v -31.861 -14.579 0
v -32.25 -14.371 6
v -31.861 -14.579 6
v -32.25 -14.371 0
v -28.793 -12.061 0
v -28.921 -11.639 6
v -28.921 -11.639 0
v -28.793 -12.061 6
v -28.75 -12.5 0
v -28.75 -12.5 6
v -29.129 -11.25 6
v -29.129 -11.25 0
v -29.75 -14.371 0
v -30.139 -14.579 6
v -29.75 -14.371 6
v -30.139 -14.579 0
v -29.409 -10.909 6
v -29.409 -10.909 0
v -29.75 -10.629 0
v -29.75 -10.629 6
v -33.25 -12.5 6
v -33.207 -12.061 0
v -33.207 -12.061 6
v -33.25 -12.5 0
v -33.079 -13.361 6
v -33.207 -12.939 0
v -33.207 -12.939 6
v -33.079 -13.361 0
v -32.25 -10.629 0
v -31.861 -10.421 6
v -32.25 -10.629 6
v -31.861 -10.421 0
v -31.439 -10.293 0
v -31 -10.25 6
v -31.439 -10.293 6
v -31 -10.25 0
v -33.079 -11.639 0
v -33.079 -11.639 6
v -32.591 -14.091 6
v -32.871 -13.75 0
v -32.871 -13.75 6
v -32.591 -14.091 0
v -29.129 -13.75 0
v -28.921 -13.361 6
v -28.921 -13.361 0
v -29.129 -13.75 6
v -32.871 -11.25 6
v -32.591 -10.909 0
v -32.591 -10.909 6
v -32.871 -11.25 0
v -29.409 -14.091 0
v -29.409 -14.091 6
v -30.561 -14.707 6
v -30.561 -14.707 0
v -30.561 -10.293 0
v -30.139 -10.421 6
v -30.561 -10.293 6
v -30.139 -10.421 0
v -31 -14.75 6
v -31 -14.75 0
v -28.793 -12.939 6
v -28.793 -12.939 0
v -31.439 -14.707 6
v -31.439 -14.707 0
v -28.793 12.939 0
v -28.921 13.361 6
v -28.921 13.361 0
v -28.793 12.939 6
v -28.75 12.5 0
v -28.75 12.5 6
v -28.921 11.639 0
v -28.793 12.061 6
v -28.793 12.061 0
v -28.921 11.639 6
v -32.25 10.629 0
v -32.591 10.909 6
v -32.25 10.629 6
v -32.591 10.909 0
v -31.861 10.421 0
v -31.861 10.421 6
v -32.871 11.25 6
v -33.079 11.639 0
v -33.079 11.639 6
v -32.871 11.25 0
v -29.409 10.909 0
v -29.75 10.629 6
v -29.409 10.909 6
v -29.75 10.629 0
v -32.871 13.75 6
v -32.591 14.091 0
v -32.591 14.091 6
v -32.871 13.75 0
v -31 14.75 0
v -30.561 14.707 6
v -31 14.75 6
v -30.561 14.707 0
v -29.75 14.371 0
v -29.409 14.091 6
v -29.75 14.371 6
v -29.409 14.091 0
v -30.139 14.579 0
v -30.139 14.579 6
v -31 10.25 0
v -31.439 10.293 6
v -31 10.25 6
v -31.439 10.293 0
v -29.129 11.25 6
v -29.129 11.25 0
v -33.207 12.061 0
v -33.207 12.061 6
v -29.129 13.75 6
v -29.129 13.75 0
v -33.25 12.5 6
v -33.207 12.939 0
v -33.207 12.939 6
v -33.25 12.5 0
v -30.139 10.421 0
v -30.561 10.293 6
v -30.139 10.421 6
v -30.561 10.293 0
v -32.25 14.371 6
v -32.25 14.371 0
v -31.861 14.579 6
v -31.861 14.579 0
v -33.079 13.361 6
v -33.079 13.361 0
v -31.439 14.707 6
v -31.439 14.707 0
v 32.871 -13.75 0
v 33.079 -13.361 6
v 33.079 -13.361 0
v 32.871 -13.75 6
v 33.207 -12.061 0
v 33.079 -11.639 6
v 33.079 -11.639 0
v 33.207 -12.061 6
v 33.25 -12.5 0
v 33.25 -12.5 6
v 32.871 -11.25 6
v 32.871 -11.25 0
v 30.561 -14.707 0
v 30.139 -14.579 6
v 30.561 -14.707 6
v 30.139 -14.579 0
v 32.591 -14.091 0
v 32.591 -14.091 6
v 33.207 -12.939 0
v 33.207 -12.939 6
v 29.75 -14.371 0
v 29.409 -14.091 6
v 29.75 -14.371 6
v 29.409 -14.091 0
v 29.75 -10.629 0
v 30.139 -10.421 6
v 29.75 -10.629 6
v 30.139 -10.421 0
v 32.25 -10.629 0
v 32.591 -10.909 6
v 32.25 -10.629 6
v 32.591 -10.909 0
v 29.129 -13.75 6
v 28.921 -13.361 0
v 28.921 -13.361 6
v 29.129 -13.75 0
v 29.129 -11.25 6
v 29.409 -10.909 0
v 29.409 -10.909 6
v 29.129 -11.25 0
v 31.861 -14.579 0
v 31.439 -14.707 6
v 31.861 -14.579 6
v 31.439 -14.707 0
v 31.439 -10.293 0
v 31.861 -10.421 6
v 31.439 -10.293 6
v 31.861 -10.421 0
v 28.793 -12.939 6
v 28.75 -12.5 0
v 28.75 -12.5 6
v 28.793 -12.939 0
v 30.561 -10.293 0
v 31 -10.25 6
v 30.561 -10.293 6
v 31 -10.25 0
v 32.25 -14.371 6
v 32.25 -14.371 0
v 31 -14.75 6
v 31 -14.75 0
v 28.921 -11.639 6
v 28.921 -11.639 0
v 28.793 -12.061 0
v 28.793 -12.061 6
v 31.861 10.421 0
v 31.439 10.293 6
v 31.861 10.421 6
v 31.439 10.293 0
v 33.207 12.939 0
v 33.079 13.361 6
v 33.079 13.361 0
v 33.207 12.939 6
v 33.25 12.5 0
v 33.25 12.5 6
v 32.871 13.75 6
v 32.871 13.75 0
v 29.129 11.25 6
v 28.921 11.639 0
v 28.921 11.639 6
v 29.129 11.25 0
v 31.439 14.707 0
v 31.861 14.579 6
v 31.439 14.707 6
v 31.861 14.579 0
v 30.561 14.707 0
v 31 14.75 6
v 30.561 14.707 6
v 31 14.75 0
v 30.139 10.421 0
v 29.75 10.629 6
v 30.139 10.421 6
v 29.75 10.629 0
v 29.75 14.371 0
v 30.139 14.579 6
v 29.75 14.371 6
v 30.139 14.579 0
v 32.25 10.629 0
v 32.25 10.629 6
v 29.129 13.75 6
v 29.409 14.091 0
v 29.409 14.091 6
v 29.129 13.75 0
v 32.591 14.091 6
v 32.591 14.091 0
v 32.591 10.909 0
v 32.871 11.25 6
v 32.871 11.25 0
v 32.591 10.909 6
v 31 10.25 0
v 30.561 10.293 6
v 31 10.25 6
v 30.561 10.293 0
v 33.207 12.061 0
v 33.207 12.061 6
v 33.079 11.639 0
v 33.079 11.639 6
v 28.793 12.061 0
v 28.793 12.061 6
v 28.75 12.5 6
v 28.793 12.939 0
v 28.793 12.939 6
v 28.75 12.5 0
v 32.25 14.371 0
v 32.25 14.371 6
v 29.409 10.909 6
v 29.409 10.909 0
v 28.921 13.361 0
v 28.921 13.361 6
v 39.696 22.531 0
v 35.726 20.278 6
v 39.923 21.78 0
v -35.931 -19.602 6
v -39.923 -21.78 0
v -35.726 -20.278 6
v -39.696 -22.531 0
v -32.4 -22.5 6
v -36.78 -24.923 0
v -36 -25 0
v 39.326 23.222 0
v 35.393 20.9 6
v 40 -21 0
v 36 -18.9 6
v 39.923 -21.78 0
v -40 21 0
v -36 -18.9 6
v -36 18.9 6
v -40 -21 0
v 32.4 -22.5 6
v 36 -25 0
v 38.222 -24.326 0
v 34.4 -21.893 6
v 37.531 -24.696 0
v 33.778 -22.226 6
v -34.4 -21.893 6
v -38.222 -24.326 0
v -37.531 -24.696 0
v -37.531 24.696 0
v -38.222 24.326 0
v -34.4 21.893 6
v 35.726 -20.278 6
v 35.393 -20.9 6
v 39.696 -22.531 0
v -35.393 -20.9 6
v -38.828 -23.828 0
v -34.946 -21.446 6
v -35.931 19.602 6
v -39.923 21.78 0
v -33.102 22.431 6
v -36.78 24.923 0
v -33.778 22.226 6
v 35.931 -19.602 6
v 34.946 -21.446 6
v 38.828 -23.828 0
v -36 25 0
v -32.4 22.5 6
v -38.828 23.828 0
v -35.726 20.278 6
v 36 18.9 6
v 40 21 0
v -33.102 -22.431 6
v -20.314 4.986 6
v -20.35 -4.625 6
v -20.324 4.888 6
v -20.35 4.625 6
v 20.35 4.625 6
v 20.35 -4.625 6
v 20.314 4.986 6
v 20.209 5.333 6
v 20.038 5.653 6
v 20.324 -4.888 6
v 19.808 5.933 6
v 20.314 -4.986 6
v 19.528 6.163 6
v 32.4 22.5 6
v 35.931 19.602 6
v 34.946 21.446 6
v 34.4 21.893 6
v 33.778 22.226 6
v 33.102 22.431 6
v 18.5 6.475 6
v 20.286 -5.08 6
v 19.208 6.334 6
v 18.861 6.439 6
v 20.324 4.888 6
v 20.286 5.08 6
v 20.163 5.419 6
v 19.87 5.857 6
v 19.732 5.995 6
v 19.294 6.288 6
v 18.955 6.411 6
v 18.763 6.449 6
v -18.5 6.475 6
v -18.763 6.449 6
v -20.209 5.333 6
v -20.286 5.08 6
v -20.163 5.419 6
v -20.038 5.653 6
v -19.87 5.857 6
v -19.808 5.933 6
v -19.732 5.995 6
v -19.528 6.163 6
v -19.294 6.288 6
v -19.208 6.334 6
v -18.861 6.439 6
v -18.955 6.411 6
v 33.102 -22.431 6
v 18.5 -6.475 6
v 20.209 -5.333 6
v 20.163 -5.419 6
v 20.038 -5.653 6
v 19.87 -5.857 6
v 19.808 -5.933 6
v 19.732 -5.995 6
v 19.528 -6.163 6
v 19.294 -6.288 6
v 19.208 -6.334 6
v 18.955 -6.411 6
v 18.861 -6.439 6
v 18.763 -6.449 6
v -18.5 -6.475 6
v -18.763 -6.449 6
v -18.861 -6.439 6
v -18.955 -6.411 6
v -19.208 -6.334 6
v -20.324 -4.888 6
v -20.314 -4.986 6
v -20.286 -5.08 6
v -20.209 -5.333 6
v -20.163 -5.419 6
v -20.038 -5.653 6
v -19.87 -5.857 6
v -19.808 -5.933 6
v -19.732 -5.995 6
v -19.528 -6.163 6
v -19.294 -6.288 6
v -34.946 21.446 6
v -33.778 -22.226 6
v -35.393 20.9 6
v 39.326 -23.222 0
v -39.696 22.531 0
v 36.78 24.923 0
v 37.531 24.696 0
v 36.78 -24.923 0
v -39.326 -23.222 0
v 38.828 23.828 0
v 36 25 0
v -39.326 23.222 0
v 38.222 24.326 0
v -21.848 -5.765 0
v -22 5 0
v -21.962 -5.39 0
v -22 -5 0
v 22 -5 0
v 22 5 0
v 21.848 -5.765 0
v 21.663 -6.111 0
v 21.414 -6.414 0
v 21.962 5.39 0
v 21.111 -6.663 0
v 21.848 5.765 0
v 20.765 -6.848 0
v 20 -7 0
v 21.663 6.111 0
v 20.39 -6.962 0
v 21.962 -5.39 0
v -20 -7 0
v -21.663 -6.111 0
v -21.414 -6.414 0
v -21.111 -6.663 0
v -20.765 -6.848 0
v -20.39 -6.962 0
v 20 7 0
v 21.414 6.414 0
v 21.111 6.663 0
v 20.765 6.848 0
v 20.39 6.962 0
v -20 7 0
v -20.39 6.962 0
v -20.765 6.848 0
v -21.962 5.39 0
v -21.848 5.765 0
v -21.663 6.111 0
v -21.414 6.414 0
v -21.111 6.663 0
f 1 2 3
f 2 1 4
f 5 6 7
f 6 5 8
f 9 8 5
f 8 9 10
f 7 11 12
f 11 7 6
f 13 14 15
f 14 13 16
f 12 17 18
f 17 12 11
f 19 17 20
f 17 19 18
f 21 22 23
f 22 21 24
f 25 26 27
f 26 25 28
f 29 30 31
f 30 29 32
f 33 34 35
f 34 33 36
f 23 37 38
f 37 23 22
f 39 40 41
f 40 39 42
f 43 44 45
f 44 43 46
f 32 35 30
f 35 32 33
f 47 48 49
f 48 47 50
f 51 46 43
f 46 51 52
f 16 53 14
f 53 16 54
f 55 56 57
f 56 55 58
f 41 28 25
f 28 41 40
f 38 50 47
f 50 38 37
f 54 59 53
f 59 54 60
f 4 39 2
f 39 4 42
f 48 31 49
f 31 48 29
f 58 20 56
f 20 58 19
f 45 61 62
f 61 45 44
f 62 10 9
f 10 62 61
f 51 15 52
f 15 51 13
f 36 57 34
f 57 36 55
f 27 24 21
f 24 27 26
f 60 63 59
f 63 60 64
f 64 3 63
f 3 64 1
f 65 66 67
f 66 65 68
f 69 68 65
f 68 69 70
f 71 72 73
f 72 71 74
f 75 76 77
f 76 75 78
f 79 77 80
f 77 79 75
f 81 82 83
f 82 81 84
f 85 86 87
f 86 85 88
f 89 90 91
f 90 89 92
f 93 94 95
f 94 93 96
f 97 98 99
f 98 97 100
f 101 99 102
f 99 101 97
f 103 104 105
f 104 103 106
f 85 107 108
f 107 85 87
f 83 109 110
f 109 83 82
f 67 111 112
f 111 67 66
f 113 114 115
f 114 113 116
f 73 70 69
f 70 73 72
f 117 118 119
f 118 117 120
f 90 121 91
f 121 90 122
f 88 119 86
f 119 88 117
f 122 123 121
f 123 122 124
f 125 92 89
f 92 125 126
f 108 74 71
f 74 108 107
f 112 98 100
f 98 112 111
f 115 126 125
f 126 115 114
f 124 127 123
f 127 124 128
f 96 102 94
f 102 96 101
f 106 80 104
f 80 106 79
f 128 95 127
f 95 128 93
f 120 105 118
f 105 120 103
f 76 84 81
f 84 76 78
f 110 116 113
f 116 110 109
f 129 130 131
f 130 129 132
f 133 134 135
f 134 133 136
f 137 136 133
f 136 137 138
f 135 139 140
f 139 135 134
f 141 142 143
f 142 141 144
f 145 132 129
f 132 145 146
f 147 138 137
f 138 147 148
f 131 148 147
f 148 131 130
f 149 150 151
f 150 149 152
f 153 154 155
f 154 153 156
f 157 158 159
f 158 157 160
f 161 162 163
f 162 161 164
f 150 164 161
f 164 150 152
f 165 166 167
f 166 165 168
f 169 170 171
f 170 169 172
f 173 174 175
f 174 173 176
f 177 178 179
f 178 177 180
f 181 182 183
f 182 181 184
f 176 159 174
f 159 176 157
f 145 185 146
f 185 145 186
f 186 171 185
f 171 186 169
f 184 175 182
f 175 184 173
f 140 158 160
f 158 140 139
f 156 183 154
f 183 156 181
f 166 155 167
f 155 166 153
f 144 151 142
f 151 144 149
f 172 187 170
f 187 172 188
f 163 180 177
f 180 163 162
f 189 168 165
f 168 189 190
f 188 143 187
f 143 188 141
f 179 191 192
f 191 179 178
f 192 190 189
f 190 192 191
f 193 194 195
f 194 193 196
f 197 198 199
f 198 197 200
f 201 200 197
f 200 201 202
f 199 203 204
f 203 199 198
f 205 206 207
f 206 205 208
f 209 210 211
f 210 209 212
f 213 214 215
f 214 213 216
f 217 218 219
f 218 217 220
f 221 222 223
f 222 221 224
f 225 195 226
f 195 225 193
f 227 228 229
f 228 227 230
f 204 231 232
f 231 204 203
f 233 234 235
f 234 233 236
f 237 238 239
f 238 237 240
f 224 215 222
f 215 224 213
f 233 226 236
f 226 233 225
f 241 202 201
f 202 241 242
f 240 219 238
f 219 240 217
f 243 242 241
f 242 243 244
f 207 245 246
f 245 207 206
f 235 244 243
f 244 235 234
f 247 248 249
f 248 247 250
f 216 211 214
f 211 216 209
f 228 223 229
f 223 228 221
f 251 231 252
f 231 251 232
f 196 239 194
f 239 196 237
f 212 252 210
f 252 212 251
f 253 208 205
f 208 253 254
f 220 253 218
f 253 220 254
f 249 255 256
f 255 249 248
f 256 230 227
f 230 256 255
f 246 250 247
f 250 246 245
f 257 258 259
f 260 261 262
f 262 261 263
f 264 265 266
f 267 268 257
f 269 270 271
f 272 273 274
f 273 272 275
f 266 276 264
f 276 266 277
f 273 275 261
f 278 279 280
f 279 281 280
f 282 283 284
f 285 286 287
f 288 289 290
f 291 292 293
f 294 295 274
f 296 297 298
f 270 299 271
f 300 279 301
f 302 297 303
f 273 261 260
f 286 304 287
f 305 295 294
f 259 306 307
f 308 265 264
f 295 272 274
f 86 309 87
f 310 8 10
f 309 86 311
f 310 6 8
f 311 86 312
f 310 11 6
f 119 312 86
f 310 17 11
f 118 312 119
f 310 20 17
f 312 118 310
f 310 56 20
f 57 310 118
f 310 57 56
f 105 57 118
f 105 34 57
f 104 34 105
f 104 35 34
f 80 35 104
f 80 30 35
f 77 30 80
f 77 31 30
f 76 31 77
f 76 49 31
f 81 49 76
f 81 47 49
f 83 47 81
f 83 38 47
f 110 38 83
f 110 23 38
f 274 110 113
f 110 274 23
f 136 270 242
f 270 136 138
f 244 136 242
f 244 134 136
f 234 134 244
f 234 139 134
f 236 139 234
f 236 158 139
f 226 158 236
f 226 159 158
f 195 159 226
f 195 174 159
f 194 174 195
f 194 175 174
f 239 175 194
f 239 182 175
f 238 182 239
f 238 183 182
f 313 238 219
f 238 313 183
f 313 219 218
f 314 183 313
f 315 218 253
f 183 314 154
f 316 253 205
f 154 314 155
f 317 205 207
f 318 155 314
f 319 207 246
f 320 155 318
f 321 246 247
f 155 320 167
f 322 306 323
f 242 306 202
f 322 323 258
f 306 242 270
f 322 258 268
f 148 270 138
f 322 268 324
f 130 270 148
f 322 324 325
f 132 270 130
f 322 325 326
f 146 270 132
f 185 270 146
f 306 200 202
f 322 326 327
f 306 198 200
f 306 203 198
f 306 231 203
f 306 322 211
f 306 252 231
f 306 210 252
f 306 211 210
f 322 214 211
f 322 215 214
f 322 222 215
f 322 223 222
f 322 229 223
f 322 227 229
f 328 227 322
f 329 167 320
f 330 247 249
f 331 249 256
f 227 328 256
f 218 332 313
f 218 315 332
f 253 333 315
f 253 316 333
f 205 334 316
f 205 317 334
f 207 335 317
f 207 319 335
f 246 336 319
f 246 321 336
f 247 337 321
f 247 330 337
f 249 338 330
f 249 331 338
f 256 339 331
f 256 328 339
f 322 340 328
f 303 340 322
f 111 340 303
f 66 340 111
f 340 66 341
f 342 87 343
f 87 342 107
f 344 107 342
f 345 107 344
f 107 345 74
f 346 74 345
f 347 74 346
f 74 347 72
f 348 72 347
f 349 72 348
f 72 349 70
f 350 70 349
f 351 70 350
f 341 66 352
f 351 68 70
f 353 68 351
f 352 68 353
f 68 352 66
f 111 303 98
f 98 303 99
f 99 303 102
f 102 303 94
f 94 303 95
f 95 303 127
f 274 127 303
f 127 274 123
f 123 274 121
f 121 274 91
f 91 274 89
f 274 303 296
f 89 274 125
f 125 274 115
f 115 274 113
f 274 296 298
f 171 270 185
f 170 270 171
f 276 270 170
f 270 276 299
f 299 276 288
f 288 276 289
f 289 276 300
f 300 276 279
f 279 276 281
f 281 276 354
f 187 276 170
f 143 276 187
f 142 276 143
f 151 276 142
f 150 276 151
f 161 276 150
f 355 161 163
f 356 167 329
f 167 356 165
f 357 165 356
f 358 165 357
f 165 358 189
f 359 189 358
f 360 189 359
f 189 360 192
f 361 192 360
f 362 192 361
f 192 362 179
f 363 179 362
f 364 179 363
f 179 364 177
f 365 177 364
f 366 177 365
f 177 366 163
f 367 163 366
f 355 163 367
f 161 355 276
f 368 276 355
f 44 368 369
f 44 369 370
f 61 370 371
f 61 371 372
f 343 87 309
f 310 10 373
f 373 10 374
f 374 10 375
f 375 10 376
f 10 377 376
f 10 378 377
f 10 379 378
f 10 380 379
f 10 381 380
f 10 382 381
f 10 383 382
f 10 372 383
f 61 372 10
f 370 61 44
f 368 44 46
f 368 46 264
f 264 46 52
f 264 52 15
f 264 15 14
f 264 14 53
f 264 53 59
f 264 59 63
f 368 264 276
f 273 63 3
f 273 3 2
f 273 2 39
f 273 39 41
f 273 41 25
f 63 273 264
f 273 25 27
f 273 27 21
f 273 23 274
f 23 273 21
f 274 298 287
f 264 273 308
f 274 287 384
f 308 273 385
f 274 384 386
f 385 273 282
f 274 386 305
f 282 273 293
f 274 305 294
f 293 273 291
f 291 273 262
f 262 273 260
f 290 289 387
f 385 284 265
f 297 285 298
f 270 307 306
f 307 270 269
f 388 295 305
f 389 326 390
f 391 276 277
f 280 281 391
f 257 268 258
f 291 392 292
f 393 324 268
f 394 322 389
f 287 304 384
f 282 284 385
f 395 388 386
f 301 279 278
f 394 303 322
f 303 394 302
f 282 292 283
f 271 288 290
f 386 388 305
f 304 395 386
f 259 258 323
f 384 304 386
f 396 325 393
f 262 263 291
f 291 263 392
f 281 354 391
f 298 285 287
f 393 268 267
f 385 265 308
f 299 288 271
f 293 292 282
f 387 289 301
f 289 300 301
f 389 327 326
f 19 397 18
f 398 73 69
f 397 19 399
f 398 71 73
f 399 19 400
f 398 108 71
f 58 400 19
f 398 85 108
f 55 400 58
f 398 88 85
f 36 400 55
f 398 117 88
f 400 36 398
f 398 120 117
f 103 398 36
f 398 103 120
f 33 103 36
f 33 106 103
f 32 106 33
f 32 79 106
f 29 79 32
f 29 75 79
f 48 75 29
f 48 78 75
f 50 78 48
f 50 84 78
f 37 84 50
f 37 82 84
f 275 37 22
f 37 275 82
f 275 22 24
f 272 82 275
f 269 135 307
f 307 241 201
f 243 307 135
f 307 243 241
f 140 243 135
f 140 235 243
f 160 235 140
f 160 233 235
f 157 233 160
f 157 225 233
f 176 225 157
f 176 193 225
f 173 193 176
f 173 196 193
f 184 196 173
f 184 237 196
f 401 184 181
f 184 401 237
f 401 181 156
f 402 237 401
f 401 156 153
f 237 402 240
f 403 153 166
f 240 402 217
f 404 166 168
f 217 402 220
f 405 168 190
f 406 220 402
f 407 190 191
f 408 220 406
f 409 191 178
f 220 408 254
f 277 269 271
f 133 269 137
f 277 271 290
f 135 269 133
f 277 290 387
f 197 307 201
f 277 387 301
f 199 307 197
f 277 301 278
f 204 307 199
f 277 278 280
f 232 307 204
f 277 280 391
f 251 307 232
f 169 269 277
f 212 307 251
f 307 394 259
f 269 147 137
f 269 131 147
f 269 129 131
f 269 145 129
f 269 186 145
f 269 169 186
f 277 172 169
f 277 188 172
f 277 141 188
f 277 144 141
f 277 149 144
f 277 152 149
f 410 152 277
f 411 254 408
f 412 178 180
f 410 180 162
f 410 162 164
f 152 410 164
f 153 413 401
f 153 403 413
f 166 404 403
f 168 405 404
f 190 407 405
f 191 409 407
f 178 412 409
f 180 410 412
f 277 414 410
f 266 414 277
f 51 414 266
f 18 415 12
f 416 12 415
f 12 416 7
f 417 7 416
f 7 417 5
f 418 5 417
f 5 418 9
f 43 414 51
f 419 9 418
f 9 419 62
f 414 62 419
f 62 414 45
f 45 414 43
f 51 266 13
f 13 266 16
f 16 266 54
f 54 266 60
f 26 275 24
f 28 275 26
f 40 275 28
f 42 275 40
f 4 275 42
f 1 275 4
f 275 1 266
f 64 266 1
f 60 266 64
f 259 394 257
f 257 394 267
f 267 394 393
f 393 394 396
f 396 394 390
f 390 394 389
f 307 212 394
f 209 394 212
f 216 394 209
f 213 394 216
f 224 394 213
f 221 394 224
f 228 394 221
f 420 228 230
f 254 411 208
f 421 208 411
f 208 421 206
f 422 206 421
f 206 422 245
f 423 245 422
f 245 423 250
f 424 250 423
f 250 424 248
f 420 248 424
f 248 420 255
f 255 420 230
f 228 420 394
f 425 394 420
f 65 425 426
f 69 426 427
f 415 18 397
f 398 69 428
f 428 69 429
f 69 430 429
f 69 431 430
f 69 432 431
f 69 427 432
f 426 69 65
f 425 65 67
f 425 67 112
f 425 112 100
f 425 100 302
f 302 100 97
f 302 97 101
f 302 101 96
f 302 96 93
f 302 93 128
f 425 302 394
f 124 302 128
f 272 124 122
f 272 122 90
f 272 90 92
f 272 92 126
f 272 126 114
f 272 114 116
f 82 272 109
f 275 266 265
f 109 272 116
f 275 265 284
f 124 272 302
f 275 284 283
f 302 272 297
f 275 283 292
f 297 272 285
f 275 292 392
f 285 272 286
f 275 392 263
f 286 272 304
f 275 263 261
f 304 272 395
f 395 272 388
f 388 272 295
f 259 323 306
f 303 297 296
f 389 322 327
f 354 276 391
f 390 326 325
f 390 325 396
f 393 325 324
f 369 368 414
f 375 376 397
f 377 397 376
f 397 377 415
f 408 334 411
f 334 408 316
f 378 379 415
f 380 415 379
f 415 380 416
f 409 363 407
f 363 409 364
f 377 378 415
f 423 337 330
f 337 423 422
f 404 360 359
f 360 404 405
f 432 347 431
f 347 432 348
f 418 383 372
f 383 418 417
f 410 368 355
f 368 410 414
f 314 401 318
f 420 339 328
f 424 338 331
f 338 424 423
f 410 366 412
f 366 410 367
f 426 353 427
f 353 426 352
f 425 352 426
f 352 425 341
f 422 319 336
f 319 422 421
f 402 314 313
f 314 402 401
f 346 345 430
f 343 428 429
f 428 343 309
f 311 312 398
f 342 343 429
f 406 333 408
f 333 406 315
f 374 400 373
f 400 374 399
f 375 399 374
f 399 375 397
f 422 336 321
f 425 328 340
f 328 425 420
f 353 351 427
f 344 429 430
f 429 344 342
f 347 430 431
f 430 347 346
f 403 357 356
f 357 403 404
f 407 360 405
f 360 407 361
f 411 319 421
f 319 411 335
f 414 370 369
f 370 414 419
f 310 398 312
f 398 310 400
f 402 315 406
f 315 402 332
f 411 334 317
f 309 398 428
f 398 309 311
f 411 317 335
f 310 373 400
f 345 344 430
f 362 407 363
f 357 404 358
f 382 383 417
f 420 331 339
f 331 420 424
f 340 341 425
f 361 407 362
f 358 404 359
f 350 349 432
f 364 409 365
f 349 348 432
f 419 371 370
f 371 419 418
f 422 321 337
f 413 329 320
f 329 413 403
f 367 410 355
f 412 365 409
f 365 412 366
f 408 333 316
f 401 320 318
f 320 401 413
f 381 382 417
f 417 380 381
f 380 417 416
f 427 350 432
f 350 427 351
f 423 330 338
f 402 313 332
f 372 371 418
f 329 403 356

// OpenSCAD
$fn = 32;

// ----------------------------------------------------------------------
// Display bezel: 80 x 50 mm frame, opening 44x14 mm
// ----------------------------------------------------------------------

// --- parameters (mm) ---
length = 80;              // frame outside length, X
width = 50;               // frame outside width, Y
frame_w = 18;             // frame width
thickness = 6;            // frame thickness
corner_r = 4;             // outside corner radius
chamfer = 0.9;            // outer wall taper
funnel = 0.9;             // inner opening taper
opening_l = 44;           // opening length
opening_w = 14;           // opening width
inner_r = 2;              // opening corner radius
hole_d = 4.5;             // mounting screw clearance
holes_per_side = 2;       // holes per short side
hole_inset = 9;           // hole centre inset from the outside edge

/* rounded-rectangle outlines, generated with loops */
module rounded_ring(l_nom, w_nom, r) {
  hull() {
    for (sx = [-1, 1]) for (sy = [-1, 1])
      translate([sx * (l_nom / 2 - r), sy * (w_nom / 2 - r)]) circle(r = r);
  }
}

difference() {
  /* frame body, drafted so the outer edge is a variable-depth chamfer */
  linear_extrude(height = thickness, scale = chamfer)
    rounded_ring(length, width, corner_r);
  /* viewing opening, drafted the other way for a funnel edge */
  linear_extrude(height = thickness + 2, scale = funnel)
    translate([0, 0, -1]) rounded_ring(opening_l, opening_w, inner_r);
  /* mounting screws through the frame lands */
  for (sx = [-1, 1]) for (i = [1 : holes_per_side])
    translate([sx * (length / 2 - hole_inset),
               (i - (holes_per_side + 1) / 2) * width * 0.5, -1])
      cylinder(h = thickness + 2, d = hole_d);
}
